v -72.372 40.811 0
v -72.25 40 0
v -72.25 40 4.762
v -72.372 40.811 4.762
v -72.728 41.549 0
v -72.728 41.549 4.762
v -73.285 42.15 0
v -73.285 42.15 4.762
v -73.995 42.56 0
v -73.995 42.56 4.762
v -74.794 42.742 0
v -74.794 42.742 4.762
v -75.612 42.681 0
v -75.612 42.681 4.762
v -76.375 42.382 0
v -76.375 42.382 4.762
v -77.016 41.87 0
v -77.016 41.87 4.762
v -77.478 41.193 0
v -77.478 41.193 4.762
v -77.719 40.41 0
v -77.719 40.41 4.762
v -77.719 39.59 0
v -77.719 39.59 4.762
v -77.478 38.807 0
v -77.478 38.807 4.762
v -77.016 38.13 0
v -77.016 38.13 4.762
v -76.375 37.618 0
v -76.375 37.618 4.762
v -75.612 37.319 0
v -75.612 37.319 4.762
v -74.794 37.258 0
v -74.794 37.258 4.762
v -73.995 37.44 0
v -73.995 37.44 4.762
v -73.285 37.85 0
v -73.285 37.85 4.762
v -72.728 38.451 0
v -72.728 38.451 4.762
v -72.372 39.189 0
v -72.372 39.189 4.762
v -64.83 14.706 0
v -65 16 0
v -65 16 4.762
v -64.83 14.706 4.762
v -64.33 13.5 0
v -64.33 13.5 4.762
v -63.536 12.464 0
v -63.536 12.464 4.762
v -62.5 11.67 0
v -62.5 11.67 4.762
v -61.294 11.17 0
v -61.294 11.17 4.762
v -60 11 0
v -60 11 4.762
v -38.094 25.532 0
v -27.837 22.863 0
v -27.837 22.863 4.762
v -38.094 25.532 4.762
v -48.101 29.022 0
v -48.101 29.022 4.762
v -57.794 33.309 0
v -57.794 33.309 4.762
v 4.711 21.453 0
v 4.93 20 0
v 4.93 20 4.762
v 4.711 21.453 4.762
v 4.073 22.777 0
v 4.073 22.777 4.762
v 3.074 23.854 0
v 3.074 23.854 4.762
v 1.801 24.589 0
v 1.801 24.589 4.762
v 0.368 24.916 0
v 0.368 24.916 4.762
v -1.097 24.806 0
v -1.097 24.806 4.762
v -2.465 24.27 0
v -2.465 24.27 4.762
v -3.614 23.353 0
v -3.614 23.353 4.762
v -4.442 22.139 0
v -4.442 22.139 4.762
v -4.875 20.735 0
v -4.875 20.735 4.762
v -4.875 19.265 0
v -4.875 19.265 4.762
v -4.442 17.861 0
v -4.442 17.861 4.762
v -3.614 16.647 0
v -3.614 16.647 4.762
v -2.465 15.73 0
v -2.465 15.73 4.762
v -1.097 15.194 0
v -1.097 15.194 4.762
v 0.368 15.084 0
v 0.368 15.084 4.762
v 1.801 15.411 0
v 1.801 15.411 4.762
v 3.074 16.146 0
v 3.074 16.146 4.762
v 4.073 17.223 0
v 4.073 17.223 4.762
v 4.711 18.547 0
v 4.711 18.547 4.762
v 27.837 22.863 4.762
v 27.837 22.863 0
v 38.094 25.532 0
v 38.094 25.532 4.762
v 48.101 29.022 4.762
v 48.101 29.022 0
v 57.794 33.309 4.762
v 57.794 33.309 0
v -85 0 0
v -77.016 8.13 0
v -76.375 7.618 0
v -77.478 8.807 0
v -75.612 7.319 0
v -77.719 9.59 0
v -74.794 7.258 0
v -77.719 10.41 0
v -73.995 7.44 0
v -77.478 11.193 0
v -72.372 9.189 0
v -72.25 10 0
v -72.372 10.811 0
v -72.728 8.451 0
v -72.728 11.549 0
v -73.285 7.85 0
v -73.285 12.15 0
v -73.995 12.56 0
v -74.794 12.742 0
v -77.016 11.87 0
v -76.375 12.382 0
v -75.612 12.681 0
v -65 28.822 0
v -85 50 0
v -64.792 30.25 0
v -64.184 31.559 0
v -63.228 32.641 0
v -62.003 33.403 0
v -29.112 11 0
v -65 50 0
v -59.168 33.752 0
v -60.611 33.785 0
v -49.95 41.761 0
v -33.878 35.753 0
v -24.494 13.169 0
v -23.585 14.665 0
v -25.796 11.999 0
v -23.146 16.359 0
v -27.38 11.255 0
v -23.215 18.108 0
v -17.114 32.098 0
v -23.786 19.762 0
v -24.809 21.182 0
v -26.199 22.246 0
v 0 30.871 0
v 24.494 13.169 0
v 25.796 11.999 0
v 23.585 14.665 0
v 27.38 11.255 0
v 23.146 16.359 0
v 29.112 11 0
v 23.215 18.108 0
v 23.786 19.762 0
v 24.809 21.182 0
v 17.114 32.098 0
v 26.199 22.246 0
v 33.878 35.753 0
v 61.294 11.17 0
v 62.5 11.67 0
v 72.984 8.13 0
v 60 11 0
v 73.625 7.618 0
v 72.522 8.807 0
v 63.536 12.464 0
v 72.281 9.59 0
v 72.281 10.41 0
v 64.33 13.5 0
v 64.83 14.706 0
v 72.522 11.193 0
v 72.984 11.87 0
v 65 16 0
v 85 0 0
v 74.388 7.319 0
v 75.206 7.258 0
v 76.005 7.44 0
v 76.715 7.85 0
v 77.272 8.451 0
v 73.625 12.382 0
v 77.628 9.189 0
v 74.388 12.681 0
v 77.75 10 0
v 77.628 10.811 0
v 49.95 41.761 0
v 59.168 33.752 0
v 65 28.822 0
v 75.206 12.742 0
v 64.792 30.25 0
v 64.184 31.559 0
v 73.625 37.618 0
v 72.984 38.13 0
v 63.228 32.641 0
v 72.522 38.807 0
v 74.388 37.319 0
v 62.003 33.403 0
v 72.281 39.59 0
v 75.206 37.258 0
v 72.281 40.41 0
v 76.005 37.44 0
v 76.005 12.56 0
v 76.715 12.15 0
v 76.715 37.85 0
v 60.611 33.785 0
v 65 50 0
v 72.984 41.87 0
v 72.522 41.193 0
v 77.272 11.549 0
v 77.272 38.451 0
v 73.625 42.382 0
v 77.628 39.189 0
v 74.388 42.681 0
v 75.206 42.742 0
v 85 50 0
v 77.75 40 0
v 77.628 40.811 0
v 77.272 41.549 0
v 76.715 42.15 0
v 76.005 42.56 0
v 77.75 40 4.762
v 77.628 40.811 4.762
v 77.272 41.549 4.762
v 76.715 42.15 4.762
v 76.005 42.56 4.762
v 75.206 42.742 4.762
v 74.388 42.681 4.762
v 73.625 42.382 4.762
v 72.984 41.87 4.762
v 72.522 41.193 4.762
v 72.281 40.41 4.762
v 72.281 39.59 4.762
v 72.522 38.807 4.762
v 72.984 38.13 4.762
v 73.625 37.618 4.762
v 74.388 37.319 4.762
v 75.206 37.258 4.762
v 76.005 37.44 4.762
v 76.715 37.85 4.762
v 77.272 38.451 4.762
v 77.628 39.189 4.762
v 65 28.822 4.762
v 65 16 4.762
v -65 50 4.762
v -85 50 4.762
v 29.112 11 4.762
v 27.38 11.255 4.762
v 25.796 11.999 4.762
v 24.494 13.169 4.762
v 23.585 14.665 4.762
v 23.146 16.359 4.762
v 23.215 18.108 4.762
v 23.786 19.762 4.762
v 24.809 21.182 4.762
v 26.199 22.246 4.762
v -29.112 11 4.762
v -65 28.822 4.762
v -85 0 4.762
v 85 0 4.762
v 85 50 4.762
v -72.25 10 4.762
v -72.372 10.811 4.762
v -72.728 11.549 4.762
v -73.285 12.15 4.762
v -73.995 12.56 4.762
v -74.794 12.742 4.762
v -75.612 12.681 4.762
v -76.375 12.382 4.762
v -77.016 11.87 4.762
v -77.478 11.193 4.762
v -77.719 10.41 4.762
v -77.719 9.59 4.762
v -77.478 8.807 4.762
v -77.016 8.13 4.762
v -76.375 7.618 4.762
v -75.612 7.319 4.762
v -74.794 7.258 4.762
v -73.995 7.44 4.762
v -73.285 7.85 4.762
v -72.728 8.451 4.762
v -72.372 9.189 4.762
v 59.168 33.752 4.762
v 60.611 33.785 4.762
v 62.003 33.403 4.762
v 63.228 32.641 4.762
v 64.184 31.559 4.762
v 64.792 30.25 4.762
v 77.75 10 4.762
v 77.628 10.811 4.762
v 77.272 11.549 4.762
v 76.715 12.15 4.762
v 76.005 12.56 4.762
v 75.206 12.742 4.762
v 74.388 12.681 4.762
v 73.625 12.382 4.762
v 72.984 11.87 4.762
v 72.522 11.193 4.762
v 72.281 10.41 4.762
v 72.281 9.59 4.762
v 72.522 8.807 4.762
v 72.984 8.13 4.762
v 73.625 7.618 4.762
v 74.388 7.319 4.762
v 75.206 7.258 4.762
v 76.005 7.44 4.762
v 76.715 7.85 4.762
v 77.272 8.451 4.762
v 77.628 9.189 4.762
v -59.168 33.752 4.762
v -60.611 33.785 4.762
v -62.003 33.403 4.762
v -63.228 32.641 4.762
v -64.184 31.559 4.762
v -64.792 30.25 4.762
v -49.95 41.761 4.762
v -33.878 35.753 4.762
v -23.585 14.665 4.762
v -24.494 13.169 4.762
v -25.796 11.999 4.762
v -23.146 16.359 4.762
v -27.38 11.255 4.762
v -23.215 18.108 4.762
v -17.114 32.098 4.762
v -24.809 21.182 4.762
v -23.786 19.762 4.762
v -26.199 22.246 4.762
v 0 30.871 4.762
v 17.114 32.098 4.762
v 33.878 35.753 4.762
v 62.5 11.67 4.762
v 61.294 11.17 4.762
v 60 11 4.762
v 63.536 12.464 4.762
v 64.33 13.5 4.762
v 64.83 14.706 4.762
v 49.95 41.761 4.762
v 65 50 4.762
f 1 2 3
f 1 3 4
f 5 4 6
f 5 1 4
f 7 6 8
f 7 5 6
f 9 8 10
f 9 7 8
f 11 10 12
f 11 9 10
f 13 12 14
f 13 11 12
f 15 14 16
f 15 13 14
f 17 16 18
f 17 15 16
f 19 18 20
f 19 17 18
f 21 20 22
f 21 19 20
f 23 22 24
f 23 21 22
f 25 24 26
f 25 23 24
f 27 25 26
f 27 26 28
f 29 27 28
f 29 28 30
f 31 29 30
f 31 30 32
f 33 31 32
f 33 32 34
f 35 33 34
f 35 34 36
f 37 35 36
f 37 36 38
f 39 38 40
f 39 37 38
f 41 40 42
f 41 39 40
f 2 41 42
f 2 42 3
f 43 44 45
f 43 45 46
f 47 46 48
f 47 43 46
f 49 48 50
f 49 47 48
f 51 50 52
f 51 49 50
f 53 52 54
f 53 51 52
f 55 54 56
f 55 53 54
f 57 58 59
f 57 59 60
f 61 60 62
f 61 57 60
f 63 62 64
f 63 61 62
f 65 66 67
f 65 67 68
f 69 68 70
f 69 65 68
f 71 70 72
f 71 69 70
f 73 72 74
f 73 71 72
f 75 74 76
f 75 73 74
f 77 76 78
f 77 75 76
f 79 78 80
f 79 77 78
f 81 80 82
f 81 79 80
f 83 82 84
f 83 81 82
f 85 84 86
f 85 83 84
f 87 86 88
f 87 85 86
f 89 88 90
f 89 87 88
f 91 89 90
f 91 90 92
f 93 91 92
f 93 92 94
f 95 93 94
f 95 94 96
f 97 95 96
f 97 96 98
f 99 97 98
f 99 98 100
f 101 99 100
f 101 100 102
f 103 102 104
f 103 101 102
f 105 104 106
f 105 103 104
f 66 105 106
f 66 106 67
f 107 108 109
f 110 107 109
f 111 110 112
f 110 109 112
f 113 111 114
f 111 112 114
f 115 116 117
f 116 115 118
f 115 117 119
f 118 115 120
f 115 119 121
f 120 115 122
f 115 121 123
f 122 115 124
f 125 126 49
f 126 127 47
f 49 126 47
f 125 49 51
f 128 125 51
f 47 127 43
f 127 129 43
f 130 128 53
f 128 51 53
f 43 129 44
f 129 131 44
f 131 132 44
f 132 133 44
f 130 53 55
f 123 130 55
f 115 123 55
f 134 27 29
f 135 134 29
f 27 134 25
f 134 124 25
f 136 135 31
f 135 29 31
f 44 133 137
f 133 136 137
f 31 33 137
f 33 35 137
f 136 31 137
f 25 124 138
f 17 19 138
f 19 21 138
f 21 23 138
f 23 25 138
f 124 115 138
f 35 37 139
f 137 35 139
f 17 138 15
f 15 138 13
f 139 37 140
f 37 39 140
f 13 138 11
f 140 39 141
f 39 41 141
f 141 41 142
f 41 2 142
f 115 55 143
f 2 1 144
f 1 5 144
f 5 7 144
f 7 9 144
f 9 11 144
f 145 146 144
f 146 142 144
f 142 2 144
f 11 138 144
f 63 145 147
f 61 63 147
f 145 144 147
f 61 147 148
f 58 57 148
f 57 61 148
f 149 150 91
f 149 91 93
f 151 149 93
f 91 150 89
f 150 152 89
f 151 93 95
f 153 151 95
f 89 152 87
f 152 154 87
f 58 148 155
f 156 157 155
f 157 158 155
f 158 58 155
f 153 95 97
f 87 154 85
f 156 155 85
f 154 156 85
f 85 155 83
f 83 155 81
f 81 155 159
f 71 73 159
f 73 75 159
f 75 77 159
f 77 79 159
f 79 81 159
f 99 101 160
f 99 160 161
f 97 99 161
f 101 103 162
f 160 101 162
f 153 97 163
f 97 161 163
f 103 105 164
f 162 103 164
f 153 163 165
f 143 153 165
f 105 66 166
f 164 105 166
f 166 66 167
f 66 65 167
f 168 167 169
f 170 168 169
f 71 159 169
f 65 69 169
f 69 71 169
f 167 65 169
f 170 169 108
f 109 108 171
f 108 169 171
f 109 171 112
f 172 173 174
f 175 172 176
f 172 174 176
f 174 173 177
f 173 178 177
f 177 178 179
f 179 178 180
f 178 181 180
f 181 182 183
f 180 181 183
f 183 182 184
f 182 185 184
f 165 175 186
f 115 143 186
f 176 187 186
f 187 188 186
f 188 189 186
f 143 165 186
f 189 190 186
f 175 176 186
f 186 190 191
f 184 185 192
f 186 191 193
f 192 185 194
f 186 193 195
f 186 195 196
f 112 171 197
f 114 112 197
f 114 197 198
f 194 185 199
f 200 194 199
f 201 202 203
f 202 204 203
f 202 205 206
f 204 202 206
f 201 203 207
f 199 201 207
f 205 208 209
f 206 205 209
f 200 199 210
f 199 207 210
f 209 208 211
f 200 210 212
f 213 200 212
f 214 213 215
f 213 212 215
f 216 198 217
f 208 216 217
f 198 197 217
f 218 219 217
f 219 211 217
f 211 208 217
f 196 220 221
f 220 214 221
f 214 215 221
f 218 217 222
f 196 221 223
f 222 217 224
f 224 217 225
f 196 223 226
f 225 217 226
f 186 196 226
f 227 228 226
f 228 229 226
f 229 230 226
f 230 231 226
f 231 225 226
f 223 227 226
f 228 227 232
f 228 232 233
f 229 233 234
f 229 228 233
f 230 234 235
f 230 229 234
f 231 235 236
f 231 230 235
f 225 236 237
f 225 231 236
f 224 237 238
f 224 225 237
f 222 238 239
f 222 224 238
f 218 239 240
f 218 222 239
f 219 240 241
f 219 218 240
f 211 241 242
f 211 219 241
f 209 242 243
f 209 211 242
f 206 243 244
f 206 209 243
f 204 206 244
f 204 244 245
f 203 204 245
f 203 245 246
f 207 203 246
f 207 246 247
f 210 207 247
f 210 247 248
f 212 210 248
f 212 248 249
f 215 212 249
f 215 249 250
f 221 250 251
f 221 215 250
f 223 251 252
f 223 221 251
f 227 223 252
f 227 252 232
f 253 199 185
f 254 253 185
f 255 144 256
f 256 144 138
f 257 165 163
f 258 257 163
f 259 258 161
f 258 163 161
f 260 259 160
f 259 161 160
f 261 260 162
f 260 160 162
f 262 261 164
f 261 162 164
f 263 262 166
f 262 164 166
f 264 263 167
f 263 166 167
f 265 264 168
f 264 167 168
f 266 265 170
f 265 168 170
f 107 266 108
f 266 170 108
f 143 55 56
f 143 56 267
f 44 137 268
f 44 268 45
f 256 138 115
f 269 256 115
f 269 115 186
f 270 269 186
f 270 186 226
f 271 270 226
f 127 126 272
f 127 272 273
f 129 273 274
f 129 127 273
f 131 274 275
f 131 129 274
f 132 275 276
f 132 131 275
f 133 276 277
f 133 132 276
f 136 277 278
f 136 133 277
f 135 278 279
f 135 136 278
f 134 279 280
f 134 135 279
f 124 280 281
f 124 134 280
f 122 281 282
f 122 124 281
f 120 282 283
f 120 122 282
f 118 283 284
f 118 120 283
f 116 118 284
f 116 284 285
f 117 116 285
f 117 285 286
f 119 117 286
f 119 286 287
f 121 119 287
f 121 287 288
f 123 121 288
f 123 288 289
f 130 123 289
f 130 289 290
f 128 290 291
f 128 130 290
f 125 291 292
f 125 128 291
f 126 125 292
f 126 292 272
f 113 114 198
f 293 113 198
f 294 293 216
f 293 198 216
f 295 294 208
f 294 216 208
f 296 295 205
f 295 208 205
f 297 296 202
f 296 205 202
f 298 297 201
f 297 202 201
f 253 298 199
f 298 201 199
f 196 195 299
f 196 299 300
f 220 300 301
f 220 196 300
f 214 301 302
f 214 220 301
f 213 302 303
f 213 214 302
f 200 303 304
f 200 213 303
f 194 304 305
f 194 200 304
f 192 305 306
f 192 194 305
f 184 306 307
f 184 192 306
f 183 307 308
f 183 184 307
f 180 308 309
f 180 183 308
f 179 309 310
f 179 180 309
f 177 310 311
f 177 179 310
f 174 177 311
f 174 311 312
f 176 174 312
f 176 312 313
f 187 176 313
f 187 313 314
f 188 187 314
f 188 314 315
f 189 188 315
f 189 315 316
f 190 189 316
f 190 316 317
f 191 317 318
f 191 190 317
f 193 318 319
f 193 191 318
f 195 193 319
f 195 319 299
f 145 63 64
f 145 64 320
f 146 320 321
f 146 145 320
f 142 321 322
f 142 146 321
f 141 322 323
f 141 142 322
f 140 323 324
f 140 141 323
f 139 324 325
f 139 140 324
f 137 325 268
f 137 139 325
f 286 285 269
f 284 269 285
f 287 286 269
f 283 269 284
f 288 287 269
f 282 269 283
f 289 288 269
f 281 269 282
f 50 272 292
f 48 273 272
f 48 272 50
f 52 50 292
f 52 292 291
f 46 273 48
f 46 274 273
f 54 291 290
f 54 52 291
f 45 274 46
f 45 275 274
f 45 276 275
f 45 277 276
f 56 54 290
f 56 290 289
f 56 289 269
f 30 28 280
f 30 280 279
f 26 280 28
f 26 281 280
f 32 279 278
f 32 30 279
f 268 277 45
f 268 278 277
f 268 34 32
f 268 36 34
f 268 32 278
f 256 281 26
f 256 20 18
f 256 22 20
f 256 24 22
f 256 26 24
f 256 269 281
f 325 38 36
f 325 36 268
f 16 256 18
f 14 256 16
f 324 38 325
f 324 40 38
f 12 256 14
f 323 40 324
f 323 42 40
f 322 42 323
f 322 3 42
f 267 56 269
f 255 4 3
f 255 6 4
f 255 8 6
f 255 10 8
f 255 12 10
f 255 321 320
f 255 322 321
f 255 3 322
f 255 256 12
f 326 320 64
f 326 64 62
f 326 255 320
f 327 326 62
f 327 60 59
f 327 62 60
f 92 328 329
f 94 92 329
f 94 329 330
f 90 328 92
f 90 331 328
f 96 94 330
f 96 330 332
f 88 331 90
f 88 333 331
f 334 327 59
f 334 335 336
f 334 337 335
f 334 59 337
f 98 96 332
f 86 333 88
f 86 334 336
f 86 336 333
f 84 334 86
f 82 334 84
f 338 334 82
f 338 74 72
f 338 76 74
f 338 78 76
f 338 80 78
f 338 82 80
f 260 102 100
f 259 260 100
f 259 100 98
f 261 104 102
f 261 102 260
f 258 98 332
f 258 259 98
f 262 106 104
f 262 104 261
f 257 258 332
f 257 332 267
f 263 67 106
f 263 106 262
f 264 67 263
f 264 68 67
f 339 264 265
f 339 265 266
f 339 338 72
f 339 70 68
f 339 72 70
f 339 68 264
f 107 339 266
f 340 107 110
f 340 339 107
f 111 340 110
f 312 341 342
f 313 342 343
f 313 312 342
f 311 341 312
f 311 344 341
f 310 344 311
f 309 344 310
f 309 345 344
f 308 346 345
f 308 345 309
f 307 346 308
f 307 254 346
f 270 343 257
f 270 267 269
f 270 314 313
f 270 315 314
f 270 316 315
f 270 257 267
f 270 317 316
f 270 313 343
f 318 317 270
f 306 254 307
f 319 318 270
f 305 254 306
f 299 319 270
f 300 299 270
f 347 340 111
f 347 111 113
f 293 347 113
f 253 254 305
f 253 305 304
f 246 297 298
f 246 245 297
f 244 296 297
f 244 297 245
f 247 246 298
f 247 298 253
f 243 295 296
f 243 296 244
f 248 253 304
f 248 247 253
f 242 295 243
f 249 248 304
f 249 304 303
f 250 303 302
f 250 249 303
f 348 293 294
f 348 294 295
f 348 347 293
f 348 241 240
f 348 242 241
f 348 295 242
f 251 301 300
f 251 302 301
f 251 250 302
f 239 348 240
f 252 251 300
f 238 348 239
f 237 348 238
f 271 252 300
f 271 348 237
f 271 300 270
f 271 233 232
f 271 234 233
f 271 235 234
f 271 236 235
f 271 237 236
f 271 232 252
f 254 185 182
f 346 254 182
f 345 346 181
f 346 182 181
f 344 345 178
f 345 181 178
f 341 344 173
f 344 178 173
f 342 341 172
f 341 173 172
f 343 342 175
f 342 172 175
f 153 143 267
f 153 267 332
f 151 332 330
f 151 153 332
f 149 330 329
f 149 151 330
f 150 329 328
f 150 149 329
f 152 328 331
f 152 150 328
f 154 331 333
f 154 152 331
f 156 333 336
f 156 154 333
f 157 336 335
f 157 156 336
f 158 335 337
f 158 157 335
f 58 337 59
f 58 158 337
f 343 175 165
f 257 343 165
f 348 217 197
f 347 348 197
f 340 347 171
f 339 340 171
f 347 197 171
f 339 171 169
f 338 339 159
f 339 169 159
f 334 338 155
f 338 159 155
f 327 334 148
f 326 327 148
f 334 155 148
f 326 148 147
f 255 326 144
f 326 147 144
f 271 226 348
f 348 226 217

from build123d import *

# Parameters (mm, degrees)
SKETCH1_R           = 4.93
SKETCH1_R_2         = 2.75
BOSS_EXTRUDE1_DEPTH = 4.7625


with BuildPart() as part:
    # Sketch1 → Boss-Extrude1 (new body)
    with BuildSketch(Plane.XY):
        with BuildLine():
            Line((-85, 0), (85, 0))
            Line((85, 0), (85, 50))
            Line((85, 50), (65, 50))
            ThreePointArc((65, 50), (0, 30.871205009), (-65, 50))
            Line((-65, 50), (-85, 50))
            Line((-85, 50), (-85, 0))
        make_face()
        with Locations((0, 20)):
            Circle(SKETCH1_R, mode=Mode.SUBTRACT)
        with Locations((-75, 40)):
            Circle(SKETCH1_R_2, mode=Mode.SUBTRACT)
        with Locations((-75, 10)):
            Circle(SKETCH1_R_2, mode=Mode.SUBTRACT)
        with Locations((75, 40)):
            Circle(SKETCH1_R_2, mode=Mode.SUBTRACT)
        with Locations((75, 10)):
            Circle(SKETCH1_R_2, mode=Mode.SUBTRACT)
        with BuildLine():
            Line((-65, 28.82203459), (-65, 16))
            ThreePointArc((-65, 16), (-63.535533906, 12.464466094), (-60, 11))
            Line((-60, 11), (-29.111861318, 11))
            ThreePointArc((-29.111861318, 11), (-23.146216554, 16.358842801), (-27.836889289, 22.862972482))
            ThreePointArc((-27.836889289, 22.862972482), (-43.132909972, 27.17580462), (-57.794117647, 33.309136444))
            ThreePointArc((-57.794117647, 33.309136444), (-62.642970699, 33.066408028), (-65, 28.82203459))
        make_face(mode=Mode.SUBTRACT)
        with BuildLine():
            Line((65, 28.82203459), (65, 16))
            ThreePointArc((65, 16), (63.535533906, 12.464466094), (60, 11))
            Line((60, 11), (29.111861318, 11))
            ThreePointArc((29.111861318, 11), (23.146216554, 16.358842801), (27.836889289, 22.862972482))
            ThreePointArc((27.836889289, 22.862972482), (43.132909972, 27.17580462), (57.794117647, 33.309136444))
            ThreePointArc((57.794117647, 33.309136444), (62.642970699, 33.066408028), (65, 28.82203459))
        make_face(mode=Mode.SUBTRACT)
    extrude(amount=BOSS_EXTRUDE1_DEPTH)


solid = part.part
